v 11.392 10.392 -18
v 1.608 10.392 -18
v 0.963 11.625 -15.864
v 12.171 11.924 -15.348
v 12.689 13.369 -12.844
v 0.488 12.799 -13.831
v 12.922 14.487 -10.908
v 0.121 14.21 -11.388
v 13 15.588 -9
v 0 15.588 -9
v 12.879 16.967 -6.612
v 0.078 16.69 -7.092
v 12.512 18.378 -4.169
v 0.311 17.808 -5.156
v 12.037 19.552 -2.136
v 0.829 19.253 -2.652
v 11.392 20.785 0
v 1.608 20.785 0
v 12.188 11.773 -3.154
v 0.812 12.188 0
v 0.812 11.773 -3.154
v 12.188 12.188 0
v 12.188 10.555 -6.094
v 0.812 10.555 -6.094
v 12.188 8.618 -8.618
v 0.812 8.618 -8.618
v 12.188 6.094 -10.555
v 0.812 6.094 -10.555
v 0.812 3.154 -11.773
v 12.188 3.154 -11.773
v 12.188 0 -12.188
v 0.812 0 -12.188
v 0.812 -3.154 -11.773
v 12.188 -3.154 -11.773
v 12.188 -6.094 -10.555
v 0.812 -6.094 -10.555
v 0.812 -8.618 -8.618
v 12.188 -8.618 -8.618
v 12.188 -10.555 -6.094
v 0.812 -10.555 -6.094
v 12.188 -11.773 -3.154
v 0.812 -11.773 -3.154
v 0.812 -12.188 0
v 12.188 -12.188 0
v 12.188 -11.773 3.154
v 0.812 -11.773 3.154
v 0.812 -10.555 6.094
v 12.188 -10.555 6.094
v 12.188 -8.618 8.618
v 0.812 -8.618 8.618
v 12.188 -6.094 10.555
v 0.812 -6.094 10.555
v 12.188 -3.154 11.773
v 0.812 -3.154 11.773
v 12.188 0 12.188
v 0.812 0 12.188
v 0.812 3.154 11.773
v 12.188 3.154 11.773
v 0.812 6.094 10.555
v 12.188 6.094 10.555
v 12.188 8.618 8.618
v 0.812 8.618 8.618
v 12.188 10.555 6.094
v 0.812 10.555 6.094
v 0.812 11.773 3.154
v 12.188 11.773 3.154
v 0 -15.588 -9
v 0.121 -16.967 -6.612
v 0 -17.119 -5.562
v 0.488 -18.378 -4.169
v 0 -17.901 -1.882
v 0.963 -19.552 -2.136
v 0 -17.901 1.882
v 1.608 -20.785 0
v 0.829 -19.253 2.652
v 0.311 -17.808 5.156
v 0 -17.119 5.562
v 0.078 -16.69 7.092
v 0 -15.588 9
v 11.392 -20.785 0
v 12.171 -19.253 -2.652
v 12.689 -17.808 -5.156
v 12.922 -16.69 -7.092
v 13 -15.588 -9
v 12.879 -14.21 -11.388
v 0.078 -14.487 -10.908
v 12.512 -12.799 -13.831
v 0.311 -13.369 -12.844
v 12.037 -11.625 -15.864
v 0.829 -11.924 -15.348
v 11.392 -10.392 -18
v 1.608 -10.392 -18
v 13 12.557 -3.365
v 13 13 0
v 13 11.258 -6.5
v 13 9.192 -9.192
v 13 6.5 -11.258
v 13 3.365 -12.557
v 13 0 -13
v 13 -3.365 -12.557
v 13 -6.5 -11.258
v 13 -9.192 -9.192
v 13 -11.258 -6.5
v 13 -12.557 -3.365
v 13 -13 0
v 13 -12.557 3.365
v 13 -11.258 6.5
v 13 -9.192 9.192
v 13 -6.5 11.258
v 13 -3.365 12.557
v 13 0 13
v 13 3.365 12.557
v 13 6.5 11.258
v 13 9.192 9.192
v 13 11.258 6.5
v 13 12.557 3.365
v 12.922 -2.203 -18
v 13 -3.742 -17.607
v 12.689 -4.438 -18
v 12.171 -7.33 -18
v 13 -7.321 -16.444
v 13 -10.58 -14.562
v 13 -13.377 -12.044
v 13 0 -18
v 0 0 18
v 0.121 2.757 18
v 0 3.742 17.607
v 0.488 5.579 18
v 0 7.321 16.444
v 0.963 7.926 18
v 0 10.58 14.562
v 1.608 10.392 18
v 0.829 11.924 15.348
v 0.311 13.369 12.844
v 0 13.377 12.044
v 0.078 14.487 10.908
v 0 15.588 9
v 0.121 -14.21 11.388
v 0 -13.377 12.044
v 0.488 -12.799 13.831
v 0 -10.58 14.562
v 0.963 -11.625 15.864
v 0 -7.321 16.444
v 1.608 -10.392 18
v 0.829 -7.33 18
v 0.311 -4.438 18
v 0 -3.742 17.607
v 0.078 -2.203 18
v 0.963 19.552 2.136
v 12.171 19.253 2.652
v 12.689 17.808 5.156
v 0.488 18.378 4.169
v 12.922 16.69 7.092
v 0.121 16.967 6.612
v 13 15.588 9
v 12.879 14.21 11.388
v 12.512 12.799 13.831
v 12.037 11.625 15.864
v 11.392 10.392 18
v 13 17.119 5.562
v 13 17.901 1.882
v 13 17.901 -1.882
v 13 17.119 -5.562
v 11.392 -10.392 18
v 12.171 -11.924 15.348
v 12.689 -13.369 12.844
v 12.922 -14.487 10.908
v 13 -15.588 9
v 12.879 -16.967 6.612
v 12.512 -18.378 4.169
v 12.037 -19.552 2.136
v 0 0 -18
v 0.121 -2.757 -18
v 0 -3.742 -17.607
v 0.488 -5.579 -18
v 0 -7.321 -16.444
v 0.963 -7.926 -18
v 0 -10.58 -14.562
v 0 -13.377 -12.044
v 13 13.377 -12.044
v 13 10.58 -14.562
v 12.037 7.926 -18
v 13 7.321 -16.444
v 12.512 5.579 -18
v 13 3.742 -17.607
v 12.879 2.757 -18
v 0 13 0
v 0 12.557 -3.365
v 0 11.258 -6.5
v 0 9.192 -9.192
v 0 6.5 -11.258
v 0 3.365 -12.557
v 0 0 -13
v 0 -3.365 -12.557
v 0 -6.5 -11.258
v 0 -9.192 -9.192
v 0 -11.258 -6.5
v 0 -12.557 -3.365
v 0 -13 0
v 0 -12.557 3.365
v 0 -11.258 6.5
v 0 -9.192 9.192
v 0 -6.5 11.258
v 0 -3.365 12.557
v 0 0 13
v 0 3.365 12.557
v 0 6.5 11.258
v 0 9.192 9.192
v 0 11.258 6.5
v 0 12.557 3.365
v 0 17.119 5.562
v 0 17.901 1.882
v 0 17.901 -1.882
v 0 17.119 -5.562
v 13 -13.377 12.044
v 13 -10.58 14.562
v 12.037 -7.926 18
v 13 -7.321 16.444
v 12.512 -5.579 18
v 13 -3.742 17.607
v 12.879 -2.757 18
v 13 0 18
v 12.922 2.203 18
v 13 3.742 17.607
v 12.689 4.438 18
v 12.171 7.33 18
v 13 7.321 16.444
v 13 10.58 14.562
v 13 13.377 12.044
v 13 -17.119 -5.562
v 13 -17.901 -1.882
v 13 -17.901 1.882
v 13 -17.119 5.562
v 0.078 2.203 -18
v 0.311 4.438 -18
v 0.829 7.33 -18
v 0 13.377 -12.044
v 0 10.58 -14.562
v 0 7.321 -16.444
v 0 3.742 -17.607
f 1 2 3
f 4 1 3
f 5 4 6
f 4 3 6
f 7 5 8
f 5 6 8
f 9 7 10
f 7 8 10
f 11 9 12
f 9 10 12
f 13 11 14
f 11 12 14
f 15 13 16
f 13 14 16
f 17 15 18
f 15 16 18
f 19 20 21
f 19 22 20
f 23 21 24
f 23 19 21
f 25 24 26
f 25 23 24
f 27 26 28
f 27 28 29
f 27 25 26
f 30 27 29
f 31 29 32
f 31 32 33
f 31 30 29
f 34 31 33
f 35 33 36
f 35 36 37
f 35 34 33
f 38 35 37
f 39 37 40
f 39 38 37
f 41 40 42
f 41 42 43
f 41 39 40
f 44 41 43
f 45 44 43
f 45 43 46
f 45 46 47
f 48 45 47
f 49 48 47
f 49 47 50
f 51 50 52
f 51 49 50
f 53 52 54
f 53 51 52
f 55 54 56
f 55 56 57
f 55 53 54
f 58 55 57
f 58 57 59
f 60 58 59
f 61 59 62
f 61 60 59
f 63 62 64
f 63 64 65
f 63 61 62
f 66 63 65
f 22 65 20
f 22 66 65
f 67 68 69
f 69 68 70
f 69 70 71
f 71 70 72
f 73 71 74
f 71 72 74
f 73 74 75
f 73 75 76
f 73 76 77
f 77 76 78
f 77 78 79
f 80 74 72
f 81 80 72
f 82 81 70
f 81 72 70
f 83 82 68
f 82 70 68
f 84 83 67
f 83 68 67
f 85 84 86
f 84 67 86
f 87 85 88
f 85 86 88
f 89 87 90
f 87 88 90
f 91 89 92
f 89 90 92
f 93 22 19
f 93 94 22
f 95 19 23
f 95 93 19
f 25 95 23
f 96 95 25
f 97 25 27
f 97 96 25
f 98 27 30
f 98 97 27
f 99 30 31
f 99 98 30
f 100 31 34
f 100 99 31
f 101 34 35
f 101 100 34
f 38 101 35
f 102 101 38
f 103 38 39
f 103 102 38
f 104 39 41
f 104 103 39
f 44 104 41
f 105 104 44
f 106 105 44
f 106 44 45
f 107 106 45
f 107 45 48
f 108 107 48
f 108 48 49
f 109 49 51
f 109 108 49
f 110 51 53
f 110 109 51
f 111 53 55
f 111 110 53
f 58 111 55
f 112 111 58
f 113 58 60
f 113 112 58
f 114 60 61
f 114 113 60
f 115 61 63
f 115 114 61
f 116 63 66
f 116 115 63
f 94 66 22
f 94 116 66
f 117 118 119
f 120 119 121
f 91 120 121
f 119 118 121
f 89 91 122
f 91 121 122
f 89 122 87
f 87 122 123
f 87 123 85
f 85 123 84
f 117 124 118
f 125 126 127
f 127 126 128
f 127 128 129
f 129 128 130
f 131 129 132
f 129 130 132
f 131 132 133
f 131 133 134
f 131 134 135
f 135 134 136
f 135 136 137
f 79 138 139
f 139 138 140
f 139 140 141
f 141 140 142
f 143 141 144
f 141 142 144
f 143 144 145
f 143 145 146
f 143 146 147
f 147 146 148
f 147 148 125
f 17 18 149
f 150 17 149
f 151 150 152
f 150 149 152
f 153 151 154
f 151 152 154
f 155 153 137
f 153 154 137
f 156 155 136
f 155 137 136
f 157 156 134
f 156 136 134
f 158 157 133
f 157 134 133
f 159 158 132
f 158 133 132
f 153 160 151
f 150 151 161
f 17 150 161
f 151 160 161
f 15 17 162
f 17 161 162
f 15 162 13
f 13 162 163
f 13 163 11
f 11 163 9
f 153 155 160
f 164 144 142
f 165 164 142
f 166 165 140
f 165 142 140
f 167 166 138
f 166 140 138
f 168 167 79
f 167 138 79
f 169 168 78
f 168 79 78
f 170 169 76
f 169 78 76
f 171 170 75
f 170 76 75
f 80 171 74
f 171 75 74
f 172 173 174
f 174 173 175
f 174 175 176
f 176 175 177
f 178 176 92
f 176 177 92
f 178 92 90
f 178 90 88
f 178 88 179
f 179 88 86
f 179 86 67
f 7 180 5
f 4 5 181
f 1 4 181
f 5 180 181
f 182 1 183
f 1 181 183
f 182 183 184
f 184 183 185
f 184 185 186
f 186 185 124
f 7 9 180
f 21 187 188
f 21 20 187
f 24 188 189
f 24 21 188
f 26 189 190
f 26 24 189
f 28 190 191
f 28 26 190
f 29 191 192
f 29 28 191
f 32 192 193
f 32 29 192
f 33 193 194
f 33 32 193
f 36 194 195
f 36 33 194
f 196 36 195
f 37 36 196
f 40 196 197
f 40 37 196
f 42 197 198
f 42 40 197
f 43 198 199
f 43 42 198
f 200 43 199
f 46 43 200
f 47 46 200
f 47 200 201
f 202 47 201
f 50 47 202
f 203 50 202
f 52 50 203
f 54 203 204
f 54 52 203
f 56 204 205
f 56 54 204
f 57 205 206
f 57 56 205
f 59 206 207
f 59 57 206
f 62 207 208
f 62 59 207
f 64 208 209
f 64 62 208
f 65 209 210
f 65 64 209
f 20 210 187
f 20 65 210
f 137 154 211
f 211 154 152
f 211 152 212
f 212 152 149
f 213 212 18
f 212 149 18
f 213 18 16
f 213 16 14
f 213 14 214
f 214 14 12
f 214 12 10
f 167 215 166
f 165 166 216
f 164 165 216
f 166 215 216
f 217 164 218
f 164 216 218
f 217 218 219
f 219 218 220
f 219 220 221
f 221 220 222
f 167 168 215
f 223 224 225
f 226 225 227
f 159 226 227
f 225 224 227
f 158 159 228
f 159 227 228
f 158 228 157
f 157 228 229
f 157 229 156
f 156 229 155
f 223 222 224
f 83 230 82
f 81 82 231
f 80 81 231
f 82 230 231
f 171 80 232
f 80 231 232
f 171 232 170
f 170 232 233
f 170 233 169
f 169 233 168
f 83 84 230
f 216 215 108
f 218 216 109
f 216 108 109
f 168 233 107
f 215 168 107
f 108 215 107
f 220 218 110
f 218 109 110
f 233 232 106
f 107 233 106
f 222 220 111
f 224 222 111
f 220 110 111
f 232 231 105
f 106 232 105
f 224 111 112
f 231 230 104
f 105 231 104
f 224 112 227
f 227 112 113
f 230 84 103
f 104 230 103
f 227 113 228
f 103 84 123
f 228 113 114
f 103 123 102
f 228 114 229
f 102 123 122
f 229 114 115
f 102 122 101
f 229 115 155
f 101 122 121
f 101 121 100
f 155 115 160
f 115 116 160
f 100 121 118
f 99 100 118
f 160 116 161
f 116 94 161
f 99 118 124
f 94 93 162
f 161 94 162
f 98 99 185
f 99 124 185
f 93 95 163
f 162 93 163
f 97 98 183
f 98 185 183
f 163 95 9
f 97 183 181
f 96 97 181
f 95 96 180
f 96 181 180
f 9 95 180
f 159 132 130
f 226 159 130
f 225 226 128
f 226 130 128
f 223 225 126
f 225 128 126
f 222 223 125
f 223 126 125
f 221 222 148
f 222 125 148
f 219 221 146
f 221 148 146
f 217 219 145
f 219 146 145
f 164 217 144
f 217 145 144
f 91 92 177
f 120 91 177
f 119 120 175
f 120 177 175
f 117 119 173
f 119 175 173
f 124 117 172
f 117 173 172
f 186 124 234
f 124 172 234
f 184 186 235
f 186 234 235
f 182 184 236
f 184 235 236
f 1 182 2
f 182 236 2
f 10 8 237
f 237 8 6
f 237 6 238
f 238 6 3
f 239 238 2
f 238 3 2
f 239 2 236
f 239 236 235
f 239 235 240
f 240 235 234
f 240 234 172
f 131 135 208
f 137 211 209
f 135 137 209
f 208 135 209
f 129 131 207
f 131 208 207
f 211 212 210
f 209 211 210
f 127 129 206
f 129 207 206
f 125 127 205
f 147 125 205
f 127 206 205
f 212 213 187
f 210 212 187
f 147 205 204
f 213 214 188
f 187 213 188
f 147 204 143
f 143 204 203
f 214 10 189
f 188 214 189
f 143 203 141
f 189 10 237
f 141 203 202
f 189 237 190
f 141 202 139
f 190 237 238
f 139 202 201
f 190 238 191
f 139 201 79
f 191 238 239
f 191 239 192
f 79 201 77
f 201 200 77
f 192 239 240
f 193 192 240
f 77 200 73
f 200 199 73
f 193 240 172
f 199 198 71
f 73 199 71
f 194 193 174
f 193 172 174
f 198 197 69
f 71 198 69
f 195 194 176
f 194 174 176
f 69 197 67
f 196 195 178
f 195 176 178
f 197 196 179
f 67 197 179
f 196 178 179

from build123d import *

# Parameters (mm, degrees)
SKETCH_2_W          = 72
SKETCH_2_H          = 72
CUT_EXTRUDE_1_DEPTH = 26


with BuildPart() as part:
    # 草图1 → 旋转1 (revolve)
    with BuildSketch(Plane.XY):
        Polygon((0, 0), (0, 18), (2.078460969, 21.6), (10.921539031, 21.6), (13, 18), (13, 0), align=None)
    revolve(axis=Axis((13, 0, 0), (-1, 0, 0)))

    # 草图2 → 切除-拉伸1 (cut)
    with BuildSketch(Plane(origin=(0, 0, 0), x_dir=(0, 0, -1), z_dir=(1, 0, 0))):
        Rectangle(SKETCH_2_W, SKETCH_2_H)
        Polygon((-18, -10.392304845), (0, -20.784609691), (18, -10.392304845), (18, 10.392304845), (0, 20.784609691), (-18, 10.392304845), align=None, mode=Mode.SUBTRACT)
    extrude(amount=CUT_EXTRUDE_1_DEPTH, mode=Mode.SUBTRACT)

    # 草图3 → 切除-旋转1 (revolve, cut)
    with BuildSketch(Plane.XY):
        Polygon((0, 0), (0, 13), (0.812, 12.188), (12.188, 12.188), (13, 13), (13, 0), align=None)
    revolve(axis=Axis((13, 0, 0), (-1, 0, 0)), mode=Mode.SUBTRACT)


solid = part.part
